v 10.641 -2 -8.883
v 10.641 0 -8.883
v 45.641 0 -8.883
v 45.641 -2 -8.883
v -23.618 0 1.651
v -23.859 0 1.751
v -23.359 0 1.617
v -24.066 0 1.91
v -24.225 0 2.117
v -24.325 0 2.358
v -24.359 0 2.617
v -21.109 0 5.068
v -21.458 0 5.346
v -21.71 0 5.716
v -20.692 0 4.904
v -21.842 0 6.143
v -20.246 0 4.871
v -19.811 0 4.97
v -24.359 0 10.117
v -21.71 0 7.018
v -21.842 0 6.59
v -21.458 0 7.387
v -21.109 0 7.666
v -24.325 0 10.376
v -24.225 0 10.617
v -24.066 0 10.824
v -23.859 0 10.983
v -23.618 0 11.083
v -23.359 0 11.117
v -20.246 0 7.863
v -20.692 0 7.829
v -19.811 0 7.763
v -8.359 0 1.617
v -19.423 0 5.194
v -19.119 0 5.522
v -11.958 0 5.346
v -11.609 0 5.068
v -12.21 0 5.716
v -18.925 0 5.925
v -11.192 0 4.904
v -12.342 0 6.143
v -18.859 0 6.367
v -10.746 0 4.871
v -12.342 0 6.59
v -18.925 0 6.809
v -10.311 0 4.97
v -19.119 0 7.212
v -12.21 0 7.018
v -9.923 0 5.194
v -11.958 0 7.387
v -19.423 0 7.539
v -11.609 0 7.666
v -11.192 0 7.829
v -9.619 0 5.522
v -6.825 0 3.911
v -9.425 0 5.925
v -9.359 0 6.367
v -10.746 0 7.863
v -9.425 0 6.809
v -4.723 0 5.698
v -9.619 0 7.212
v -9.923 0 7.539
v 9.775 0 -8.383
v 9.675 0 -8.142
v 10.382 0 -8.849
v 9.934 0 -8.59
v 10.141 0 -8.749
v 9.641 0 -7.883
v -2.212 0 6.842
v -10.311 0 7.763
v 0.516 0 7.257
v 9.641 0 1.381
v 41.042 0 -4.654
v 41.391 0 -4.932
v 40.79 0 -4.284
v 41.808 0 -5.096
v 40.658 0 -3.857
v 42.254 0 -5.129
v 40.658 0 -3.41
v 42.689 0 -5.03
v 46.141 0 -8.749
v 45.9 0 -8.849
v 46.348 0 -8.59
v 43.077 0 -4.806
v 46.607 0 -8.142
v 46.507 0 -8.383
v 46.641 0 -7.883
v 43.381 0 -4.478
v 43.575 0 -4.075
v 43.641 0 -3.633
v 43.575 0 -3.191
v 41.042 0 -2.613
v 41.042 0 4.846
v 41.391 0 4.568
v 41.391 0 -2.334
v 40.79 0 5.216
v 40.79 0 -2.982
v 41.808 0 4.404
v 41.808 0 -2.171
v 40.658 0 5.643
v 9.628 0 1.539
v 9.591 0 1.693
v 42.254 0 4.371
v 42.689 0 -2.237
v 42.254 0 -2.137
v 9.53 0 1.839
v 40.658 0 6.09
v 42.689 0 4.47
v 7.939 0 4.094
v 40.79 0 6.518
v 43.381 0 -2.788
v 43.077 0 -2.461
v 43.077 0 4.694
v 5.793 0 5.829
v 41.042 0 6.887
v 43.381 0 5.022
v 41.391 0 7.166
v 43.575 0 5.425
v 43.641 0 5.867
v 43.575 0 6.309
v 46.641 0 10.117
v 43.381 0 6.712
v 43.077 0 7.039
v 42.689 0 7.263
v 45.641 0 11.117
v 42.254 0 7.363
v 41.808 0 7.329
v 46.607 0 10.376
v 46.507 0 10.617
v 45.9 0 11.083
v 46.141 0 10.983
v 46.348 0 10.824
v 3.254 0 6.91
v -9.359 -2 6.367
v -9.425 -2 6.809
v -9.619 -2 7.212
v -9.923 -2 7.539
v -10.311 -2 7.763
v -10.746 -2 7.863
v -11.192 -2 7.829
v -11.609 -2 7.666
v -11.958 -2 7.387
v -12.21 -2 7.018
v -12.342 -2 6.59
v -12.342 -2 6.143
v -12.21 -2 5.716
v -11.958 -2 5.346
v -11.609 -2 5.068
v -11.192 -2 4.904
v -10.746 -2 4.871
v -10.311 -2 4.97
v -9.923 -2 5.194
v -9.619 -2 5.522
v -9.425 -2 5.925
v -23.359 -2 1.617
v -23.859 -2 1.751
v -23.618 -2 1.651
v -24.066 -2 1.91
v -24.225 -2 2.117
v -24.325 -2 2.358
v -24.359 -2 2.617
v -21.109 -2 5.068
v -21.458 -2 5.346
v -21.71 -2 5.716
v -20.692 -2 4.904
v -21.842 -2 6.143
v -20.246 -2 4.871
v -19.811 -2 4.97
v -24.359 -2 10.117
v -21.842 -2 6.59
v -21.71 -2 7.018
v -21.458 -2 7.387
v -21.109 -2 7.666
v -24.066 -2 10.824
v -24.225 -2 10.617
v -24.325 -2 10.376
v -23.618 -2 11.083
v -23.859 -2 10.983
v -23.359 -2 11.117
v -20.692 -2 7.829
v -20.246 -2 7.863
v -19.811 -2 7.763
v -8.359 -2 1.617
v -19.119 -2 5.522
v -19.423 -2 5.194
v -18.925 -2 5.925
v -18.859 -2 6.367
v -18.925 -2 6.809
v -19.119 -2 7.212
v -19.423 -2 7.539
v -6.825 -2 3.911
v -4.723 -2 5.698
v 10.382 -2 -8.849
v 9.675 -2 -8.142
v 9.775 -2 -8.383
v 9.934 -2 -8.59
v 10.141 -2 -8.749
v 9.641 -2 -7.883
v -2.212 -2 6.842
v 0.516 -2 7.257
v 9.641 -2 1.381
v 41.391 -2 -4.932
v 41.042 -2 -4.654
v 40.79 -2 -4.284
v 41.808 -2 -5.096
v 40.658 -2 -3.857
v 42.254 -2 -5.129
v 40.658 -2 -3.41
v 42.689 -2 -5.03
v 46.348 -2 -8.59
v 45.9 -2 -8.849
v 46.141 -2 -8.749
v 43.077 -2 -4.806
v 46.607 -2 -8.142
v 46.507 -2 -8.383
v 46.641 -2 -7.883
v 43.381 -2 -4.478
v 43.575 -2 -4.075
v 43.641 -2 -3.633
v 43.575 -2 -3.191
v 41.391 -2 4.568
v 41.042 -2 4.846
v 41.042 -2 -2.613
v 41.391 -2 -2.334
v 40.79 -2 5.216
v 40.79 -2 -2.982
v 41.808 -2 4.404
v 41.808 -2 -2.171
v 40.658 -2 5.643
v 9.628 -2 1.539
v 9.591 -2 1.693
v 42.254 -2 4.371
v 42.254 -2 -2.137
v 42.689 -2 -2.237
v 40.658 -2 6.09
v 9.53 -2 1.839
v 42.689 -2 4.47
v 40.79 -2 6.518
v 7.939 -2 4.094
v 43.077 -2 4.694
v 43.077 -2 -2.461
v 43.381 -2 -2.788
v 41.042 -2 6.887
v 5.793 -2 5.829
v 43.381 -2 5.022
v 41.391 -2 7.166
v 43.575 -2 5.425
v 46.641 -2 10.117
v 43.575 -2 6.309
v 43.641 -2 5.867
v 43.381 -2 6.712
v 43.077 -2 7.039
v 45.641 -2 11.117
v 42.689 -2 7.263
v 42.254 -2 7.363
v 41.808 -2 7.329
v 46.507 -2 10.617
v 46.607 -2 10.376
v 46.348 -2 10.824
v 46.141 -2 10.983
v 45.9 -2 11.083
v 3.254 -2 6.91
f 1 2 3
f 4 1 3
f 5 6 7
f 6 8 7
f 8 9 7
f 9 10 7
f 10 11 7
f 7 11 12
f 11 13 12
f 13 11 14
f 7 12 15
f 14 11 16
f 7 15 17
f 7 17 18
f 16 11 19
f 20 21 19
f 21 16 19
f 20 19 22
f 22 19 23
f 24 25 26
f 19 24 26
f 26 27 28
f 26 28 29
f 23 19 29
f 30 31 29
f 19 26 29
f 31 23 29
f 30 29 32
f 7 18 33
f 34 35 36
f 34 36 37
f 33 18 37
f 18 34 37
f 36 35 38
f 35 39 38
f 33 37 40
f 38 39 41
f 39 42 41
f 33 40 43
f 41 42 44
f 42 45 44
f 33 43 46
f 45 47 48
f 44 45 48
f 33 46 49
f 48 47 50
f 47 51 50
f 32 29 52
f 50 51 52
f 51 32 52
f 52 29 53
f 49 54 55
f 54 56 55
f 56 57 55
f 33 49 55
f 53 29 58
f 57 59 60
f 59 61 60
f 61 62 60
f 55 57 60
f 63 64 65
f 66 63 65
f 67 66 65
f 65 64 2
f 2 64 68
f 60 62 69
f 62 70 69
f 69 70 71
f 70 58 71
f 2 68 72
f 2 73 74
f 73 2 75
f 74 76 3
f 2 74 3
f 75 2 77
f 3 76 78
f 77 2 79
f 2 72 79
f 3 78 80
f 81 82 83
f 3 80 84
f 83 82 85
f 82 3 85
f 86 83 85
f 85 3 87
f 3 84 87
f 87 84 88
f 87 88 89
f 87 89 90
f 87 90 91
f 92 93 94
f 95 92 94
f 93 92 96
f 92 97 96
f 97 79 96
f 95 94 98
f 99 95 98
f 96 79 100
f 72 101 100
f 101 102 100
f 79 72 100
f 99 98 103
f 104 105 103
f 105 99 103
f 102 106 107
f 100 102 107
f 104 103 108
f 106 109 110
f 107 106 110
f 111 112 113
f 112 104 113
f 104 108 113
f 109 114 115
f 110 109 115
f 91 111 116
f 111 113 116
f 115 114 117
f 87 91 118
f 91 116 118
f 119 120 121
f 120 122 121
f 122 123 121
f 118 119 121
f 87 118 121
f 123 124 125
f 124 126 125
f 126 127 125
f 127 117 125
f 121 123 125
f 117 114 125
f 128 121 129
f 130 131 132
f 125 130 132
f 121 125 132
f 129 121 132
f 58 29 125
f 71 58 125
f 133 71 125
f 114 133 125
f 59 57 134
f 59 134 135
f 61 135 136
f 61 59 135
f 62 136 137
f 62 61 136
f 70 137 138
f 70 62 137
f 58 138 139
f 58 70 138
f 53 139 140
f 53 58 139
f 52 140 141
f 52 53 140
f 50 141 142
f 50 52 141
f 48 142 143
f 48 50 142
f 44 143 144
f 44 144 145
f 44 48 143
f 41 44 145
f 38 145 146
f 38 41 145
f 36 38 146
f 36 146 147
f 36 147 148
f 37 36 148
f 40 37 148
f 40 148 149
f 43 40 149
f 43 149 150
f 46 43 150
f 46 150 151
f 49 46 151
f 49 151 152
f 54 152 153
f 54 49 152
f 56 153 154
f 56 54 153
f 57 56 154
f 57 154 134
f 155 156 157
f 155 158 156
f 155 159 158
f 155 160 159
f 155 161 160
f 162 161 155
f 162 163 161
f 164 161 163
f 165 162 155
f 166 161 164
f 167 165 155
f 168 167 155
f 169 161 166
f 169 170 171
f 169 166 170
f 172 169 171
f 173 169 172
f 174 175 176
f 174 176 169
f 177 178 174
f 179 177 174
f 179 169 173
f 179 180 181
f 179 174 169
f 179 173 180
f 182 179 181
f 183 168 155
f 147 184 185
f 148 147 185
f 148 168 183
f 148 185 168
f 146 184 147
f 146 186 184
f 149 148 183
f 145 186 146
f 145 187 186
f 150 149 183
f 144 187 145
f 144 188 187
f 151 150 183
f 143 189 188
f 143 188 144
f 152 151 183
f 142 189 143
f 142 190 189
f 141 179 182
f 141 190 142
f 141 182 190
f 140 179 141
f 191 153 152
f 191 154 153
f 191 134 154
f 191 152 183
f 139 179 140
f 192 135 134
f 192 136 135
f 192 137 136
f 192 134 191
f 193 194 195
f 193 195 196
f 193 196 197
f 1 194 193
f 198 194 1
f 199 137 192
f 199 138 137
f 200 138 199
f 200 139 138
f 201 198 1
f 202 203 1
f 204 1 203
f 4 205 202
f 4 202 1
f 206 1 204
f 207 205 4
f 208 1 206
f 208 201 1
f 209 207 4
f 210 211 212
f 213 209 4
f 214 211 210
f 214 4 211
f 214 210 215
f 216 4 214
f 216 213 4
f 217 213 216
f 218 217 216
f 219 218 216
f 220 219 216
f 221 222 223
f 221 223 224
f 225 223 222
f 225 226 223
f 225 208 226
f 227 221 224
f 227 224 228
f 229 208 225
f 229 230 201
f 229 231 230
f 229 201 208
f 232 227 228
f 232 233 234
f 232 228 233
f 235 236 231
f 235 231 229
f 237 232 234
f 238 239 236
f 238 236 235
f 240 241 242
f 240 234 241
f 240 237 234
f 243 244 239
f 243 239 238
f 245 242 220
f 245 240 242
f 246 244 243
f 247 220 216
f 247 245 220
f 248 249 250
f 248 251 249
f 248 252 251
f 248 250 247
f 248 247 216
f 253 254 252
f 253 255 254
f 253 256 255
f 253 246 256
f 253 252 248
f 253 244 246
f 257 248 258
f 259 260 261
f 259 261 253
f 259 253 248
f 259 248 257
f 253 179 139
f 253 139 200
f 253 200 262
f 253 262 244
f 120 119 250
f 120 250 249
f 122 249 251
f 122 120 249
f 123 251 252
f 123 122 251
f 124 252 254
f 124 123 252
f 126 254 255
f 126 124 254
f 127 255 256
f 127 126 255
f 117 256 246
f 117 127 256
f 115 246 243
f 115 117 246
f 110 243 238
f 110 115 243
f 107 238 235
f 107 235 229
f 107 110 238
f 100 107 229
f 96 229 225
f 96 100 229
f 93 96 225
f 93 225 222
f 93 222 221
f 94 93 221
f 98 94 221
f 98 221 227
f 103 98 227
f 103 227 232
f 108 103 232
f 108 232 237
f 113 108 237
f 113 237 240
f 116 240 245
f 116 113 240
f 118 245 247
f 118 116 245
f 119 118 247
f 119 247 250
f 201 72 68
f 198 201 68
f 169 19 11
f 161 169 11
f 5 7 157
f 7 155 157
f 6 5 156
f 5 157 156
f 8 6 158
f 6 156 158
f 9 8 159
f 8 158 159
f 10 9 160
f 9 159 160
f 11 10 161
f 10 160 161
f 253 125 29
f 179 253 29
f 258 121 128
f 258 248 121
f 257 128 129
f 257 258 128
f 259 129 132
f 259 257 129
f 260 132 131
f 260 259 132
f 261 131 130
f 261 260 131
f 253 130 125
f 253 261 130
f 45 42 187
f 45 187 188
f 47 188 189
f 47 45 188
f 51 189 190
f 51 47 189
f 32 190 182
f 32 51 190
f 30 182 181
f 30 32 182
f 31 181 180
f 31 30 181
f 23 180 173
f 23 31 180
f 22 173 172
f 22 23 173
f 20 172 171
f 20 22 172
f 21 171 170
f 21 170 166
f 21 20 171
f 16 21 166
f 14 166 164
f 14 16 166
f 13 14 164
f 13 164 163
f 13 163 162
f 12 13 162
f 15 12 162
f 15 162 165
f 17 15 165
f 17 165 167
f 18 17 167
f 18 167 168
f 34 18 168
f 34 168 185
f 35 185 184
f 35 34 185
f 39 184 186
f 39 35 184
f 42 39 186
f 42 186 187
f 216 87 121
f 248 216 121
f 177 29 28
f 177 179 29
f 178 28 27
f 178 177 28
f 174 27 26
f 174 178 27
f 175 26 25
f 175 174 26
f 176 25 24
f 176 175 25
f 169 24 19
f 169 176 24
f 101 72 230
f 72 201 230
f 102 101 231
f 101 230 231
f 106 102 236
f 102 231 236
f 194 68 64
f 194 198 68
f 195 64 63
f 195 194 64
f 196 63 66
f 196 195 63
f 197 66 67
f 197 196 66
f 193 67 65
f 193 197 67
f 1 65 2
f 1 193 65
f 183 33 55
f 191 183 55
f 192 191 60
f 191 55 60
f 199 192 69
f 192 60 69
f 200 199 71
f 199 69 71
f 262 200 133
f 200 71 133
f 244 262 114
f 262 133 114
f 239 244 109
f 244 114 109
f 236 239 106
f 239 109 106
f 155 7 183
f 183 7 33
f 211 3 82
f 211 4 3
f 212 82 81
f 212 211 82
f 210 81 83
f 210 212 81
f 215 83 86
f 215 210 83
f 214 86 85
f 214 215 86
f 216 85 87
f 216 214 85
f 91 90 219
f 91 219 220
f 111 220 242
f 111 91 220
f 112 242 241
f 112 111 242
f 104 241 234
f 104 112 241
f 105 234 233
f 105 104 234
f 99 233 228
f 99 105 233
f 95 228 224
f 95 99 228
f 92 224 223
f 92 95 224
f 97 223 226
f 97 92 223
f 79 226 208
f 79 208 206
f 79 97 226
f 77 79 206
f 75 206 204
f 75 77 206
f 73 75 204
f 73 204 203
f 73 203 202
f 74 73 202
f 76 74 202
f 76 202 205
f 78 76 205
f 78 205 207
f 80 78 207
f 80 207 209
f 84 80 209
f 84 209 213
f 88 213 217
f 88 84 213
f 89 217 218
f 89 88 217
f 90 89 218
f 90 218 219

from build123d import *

# Parameters (mm, degrees)
F0_R     = 1.5
F1_DEPTH = 2
F2_R     = 1
F3_R     = 1


with BuildPart() as f1:
    # F0 (on Front) → F1 (new body)
    with BuildSketch(Plane.XZ):
        with BuildLine():
            Line((46.64072, -8.883281), (46.64072, 11.116719))
            Line((46.64072, 11.116719), (-24.35928, 11.116719))
            Line((-24.35928, 11.116719), (-24.35928, 1.616719))
            Line((-24.35928, 1.616719), (-8.35928, 1.616719))
            ThreePointArc((-8.35928, 1.616719), (0.64072, 7.25782), (9.64072, 1.616719))
            Line((9.64072, 1.616719), (9.64072, -8.883281))
            Line((9.64072, -8.883281), (46.64072, -8.883281))
        make_face()
        with Locations((42.141477, -3.633281)):
            Circle(F0_R, mode=Mode.SUBTRACT)
        with Locations((-20.358523, 6.366719)):
            Circle(F0_R, mode=Mode.SUBTRACT)
        with Locations((-10.858523, 6.366719)):
            Circle(F0_R, mode=Mode.SUBTRACT)
        with Locations((42.141477, 5.866719)):
            Circle(F0_R, mode=Mode.SUBTRACT)
    extrude(amount=F1_DEPTH)

    # F2
    f2_edges = [f1.edges().sort_by_distance(p)[0] for p in [
        (9.64072, -1, 1.616719),
    ]]
    fillet(f2_edges, radius=F2_R)

    # F3
    f3_edges = [f1.edges().sort_by_distance(p)[0] for p in [
        (46.64072, -1, 11.116719),
        (-24.35928, -1, 11.116719),
        (-24.35928, -1, 1.616719),
        (9.64072, -1, -8.883281),
        (46.64072, -1, -8.883281),
    ]]
    fillet(f3_edges, radius=F3_R)


solid = f1.part
